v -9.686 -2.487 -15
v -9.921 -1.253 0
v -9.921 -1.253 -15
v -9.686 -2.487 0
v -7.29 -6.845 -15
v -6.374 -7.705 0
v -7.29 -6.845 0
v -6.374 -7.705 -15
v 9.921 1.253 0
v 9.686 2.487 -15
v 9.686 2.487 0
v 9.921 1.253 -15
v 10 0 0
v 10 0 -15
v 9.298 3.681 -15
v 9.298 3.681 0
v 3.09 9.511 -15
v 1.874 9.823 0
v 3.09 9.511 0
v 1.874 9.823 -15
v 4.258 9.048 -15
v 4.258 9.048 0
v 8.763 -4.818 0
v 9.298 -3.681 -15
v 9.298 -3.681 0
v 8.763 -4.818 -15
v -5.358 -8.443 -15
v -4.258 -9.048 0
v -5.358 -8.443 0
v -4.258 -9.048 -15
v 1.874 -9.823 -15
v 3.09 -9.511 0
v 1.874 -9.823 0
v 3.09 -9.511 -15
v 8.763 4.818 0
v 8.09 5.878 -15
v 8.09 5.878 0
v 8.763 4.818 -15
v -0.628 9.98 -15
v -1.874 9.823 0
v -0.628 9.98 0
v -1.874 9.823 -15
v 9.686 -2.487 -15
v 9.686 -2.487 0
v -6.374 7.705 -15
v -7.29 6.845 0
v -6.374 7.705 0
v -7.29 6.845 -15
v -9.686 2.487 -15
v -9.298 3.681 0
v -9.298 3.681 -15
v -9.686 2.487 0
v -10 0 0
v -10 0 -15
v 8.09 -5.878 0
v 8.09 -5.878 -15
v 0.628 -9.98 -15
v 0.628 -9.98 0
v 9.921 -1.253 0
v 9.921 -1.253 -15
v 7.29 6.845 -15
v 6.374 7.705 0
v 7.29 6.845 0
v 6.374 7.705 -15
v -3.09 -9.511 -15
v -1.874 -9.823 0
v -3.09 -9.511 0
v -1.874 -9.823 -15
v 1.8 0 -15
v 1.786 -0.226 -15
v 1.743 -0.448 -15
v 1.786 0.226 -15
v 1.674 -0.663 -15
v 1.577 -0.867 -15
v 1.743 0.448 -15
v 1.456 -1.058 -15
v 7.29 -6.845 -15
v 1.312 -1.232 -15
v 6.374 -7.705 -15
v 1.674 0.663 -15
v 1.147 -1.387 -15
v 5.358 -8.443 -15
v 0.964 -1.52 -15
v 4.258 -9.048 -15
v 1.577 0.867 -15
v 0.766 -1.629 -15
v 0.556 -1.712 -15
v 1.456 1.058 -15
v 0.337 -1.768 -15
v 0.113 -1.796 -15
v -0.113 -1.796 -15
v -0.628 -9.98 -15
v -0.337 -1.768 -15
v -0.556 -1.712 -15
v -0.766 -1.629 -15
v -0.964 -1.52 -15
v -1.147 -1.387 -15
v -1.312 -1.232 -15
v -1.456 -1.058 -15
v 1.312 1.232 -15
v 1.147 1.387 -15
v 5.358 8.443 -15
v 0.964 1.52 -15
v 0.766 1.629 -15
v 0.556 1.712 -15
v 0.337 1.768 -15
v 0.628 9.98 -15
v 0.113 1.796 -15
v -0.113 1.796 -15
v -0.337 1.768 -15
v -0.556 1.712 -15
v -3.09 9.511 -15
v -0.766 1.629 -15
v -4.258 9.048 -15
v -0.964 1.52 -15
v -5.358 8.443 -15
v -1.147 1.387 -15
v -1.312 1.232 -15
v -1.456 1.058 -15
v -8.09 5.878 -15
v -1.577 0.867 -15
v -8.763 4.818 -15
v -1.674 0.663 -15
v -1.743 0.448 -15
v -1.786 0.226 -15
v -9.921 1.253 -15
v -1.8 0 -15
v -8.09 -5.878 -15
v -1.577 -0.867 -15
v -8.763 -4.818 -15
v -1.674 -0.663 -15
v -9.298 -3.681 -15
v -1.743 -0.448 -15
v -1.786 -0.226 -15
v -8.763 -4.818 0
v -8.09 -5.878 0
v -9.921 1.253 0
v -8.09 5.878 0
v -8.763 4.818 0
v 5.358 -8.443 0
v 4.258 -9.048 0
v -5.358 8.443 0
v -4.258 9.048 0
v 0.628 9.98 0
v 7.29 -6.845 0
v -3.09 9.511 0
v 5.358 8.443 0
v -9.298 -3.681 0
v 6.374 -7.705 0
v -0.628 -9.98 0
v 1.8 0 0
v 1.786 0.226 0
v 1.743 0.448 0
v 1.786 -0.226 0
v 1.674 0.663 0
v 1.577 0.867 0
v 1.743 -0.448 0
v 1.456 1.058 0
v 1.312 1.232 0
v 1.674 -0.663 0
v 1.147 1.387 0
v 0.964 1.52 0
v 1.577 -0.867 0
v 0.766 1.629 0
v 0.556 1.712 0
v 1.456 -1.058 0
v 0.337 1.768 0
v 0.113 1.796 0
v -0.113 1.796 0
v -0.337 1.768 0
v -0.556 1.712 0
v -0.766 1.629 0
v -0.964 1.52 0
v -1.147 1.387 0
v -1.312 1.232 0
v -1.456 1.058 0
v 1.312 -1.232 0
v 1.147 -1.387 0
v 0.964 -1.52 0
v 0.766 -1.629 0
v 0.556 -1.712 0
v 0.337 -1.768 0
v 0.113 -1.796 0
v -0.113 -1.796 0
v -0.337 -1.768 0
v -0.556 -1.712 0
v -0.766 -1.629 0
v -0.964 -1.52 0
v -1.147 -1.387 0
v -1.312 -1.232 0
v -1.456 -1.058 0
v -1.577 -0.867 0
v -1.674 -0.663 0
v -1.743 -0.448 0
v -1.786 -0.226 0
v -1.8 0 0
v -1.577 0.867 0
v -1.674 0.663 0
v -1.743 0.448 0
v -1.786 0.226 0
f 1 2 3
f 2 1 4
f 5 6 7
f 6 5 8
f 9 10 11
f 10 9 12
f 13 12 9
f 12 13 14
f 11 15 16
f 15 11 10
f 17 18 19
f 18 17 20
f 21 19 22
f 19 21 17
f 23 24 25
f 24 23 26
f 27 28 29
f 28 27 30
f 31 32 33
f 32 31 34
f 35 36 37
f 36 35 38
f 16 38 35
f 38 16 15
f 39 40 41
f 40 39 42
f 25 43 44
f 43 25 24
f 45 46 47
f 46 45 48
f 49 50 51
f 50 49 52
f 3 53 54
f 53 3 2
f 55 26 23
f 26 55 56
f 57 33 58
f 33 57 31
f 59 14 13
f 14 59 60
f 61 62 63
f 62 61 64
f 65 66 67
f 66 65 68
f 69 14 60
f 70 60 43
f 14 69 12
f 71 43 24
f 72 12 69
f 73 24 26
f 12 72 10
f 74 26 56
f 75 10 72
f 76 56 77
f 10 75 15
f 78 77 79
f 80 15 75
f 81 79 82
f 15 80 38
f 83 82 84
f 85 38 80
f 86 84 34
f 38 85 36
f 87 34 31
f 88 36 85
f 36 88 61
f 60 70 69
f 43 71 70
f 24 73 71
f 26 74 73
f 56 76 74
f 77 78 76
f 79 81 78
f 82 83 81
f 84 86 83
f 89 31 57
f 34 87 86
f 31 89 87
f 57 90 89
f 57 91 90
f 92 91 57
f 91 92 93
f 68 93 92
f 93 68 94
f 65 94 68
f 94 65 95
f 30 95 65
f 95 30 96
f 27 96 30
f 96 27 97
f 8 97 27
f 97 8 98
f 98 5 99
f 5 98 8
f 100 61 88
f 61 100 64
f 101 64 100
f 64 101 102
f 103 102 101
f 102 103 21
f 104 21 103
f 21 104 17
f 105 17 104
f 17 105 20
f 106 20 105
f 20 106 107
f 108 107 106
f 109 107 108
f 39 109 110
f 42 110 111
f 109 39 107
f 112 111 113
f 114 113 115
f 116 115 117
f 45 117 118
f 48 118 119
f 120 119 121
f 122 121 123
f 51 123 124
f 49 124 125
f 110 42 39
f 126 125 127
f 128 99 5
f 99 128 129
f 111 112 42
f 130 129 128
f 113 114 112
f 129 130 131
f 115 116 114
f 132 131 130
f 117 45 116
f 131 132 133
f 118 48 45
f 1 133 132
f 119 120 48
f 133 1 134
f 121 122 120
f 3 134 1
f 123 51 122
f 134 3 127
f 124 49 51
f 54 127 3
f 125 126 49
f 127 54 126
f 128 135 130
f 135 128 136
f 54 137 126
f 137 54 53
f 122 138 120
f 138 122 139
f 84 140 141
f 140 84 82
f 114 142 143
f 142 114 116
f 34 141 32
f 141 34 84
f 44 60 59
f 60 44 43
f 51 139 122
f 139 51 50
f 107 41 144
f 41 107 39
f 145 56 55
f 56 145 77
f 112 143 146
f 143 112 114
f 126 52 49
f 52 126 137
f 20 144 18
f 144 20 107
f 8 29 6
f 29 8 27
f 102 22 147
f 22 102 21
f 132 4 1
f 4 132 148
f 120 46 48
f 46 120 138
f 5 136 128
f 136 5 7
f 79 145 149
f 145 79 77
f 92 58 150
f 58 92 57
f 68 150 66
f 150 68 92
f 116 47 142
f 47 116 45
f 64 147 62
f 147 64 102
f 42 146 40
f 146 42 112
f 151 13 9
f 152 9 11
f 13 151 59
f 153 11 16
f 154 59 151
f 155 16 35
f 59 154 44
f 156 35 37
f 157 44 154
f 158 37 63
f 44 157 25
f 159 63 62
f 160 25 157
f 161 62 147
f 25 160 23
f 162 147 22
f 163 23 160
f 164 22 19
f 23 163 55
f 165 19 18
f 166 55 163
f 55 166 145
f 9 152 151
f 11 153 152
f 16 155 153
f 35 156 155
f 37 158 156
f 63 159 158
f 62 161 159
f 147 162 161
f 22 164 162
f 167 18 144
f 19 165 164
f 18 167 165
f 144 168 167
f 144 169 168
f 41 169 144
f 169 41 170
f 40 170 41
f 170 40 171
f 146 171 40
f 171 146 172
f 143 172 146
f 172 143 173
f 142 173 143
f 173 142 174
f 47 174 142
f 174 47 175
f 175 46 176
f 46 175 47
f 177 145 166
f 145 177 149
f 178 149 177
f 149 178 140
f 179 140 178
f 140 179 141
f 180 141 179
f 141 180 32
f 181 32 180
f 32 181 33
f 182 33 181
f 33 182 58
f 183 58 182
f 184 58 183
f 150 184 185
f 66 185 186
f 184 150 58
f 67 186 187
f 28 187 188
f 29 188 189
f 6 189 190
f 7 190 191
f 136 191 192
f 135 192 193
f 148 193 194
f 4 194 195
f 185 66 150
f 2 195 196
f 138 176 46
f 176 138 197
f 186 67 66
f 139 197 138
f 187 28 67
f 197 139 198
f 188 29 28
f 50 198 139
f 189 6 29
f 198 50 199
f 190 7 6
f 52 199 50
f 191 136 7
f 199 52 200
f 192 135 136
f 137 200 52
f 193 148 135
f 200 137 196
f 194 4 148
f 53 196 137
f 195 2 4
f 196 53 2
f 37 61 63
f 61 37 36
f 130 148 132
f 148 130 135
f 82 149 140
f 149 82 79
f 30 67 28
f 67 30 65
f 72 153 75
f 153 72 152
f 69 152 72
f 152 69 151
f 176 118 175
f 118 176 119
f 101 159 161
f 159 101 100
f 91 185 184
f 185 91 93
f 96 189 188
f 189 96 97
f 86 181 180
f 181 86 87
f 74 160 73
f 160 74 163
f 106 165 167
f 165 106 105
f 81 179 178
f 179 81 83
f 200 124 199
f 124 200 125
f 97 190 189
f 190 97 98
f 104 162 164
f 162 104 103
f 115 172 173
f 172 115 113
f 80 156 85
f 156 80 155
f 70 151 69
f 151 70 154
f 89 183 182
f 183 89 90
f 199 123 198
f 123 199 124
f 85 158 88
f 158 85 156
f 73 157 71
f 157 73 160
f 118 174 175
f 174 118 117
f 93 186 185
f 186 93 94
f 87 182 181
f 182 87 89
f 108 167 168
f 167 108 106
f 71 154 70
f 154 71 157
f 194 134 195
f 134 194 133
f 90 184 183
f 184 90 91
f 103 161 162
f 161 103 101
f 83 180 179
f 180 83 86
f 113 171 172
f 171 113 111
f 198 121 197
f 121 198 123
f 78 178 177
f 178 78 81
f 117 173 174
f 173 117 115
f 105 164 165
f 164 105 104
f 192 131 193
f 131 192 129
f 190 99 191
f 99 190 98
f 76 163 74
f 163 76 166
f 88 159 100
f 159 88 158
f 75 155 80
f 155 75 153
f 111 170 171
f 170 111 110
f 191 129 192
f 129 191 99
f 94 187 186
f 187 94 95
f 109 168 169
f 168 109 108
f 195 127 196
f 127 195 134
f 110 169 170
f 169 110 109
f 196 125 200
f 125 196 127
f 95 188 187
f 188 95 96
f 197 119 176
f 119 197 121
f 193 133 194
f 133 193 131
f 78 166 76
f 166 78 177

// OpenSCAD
$fn = 50;


difference() {
	union() {
		translate(v = [0, 0, -15.0000000000]) {
			cylinder(h = 15, r = 10.0000000000);
		}
		cylinder(h = 0, r = 20.0000000000);
	}
	union() {
		#translate(v = [0, 0, -15]) {
			cylinder(h = 15, r = 1.8000000000);
		}
	}
}
